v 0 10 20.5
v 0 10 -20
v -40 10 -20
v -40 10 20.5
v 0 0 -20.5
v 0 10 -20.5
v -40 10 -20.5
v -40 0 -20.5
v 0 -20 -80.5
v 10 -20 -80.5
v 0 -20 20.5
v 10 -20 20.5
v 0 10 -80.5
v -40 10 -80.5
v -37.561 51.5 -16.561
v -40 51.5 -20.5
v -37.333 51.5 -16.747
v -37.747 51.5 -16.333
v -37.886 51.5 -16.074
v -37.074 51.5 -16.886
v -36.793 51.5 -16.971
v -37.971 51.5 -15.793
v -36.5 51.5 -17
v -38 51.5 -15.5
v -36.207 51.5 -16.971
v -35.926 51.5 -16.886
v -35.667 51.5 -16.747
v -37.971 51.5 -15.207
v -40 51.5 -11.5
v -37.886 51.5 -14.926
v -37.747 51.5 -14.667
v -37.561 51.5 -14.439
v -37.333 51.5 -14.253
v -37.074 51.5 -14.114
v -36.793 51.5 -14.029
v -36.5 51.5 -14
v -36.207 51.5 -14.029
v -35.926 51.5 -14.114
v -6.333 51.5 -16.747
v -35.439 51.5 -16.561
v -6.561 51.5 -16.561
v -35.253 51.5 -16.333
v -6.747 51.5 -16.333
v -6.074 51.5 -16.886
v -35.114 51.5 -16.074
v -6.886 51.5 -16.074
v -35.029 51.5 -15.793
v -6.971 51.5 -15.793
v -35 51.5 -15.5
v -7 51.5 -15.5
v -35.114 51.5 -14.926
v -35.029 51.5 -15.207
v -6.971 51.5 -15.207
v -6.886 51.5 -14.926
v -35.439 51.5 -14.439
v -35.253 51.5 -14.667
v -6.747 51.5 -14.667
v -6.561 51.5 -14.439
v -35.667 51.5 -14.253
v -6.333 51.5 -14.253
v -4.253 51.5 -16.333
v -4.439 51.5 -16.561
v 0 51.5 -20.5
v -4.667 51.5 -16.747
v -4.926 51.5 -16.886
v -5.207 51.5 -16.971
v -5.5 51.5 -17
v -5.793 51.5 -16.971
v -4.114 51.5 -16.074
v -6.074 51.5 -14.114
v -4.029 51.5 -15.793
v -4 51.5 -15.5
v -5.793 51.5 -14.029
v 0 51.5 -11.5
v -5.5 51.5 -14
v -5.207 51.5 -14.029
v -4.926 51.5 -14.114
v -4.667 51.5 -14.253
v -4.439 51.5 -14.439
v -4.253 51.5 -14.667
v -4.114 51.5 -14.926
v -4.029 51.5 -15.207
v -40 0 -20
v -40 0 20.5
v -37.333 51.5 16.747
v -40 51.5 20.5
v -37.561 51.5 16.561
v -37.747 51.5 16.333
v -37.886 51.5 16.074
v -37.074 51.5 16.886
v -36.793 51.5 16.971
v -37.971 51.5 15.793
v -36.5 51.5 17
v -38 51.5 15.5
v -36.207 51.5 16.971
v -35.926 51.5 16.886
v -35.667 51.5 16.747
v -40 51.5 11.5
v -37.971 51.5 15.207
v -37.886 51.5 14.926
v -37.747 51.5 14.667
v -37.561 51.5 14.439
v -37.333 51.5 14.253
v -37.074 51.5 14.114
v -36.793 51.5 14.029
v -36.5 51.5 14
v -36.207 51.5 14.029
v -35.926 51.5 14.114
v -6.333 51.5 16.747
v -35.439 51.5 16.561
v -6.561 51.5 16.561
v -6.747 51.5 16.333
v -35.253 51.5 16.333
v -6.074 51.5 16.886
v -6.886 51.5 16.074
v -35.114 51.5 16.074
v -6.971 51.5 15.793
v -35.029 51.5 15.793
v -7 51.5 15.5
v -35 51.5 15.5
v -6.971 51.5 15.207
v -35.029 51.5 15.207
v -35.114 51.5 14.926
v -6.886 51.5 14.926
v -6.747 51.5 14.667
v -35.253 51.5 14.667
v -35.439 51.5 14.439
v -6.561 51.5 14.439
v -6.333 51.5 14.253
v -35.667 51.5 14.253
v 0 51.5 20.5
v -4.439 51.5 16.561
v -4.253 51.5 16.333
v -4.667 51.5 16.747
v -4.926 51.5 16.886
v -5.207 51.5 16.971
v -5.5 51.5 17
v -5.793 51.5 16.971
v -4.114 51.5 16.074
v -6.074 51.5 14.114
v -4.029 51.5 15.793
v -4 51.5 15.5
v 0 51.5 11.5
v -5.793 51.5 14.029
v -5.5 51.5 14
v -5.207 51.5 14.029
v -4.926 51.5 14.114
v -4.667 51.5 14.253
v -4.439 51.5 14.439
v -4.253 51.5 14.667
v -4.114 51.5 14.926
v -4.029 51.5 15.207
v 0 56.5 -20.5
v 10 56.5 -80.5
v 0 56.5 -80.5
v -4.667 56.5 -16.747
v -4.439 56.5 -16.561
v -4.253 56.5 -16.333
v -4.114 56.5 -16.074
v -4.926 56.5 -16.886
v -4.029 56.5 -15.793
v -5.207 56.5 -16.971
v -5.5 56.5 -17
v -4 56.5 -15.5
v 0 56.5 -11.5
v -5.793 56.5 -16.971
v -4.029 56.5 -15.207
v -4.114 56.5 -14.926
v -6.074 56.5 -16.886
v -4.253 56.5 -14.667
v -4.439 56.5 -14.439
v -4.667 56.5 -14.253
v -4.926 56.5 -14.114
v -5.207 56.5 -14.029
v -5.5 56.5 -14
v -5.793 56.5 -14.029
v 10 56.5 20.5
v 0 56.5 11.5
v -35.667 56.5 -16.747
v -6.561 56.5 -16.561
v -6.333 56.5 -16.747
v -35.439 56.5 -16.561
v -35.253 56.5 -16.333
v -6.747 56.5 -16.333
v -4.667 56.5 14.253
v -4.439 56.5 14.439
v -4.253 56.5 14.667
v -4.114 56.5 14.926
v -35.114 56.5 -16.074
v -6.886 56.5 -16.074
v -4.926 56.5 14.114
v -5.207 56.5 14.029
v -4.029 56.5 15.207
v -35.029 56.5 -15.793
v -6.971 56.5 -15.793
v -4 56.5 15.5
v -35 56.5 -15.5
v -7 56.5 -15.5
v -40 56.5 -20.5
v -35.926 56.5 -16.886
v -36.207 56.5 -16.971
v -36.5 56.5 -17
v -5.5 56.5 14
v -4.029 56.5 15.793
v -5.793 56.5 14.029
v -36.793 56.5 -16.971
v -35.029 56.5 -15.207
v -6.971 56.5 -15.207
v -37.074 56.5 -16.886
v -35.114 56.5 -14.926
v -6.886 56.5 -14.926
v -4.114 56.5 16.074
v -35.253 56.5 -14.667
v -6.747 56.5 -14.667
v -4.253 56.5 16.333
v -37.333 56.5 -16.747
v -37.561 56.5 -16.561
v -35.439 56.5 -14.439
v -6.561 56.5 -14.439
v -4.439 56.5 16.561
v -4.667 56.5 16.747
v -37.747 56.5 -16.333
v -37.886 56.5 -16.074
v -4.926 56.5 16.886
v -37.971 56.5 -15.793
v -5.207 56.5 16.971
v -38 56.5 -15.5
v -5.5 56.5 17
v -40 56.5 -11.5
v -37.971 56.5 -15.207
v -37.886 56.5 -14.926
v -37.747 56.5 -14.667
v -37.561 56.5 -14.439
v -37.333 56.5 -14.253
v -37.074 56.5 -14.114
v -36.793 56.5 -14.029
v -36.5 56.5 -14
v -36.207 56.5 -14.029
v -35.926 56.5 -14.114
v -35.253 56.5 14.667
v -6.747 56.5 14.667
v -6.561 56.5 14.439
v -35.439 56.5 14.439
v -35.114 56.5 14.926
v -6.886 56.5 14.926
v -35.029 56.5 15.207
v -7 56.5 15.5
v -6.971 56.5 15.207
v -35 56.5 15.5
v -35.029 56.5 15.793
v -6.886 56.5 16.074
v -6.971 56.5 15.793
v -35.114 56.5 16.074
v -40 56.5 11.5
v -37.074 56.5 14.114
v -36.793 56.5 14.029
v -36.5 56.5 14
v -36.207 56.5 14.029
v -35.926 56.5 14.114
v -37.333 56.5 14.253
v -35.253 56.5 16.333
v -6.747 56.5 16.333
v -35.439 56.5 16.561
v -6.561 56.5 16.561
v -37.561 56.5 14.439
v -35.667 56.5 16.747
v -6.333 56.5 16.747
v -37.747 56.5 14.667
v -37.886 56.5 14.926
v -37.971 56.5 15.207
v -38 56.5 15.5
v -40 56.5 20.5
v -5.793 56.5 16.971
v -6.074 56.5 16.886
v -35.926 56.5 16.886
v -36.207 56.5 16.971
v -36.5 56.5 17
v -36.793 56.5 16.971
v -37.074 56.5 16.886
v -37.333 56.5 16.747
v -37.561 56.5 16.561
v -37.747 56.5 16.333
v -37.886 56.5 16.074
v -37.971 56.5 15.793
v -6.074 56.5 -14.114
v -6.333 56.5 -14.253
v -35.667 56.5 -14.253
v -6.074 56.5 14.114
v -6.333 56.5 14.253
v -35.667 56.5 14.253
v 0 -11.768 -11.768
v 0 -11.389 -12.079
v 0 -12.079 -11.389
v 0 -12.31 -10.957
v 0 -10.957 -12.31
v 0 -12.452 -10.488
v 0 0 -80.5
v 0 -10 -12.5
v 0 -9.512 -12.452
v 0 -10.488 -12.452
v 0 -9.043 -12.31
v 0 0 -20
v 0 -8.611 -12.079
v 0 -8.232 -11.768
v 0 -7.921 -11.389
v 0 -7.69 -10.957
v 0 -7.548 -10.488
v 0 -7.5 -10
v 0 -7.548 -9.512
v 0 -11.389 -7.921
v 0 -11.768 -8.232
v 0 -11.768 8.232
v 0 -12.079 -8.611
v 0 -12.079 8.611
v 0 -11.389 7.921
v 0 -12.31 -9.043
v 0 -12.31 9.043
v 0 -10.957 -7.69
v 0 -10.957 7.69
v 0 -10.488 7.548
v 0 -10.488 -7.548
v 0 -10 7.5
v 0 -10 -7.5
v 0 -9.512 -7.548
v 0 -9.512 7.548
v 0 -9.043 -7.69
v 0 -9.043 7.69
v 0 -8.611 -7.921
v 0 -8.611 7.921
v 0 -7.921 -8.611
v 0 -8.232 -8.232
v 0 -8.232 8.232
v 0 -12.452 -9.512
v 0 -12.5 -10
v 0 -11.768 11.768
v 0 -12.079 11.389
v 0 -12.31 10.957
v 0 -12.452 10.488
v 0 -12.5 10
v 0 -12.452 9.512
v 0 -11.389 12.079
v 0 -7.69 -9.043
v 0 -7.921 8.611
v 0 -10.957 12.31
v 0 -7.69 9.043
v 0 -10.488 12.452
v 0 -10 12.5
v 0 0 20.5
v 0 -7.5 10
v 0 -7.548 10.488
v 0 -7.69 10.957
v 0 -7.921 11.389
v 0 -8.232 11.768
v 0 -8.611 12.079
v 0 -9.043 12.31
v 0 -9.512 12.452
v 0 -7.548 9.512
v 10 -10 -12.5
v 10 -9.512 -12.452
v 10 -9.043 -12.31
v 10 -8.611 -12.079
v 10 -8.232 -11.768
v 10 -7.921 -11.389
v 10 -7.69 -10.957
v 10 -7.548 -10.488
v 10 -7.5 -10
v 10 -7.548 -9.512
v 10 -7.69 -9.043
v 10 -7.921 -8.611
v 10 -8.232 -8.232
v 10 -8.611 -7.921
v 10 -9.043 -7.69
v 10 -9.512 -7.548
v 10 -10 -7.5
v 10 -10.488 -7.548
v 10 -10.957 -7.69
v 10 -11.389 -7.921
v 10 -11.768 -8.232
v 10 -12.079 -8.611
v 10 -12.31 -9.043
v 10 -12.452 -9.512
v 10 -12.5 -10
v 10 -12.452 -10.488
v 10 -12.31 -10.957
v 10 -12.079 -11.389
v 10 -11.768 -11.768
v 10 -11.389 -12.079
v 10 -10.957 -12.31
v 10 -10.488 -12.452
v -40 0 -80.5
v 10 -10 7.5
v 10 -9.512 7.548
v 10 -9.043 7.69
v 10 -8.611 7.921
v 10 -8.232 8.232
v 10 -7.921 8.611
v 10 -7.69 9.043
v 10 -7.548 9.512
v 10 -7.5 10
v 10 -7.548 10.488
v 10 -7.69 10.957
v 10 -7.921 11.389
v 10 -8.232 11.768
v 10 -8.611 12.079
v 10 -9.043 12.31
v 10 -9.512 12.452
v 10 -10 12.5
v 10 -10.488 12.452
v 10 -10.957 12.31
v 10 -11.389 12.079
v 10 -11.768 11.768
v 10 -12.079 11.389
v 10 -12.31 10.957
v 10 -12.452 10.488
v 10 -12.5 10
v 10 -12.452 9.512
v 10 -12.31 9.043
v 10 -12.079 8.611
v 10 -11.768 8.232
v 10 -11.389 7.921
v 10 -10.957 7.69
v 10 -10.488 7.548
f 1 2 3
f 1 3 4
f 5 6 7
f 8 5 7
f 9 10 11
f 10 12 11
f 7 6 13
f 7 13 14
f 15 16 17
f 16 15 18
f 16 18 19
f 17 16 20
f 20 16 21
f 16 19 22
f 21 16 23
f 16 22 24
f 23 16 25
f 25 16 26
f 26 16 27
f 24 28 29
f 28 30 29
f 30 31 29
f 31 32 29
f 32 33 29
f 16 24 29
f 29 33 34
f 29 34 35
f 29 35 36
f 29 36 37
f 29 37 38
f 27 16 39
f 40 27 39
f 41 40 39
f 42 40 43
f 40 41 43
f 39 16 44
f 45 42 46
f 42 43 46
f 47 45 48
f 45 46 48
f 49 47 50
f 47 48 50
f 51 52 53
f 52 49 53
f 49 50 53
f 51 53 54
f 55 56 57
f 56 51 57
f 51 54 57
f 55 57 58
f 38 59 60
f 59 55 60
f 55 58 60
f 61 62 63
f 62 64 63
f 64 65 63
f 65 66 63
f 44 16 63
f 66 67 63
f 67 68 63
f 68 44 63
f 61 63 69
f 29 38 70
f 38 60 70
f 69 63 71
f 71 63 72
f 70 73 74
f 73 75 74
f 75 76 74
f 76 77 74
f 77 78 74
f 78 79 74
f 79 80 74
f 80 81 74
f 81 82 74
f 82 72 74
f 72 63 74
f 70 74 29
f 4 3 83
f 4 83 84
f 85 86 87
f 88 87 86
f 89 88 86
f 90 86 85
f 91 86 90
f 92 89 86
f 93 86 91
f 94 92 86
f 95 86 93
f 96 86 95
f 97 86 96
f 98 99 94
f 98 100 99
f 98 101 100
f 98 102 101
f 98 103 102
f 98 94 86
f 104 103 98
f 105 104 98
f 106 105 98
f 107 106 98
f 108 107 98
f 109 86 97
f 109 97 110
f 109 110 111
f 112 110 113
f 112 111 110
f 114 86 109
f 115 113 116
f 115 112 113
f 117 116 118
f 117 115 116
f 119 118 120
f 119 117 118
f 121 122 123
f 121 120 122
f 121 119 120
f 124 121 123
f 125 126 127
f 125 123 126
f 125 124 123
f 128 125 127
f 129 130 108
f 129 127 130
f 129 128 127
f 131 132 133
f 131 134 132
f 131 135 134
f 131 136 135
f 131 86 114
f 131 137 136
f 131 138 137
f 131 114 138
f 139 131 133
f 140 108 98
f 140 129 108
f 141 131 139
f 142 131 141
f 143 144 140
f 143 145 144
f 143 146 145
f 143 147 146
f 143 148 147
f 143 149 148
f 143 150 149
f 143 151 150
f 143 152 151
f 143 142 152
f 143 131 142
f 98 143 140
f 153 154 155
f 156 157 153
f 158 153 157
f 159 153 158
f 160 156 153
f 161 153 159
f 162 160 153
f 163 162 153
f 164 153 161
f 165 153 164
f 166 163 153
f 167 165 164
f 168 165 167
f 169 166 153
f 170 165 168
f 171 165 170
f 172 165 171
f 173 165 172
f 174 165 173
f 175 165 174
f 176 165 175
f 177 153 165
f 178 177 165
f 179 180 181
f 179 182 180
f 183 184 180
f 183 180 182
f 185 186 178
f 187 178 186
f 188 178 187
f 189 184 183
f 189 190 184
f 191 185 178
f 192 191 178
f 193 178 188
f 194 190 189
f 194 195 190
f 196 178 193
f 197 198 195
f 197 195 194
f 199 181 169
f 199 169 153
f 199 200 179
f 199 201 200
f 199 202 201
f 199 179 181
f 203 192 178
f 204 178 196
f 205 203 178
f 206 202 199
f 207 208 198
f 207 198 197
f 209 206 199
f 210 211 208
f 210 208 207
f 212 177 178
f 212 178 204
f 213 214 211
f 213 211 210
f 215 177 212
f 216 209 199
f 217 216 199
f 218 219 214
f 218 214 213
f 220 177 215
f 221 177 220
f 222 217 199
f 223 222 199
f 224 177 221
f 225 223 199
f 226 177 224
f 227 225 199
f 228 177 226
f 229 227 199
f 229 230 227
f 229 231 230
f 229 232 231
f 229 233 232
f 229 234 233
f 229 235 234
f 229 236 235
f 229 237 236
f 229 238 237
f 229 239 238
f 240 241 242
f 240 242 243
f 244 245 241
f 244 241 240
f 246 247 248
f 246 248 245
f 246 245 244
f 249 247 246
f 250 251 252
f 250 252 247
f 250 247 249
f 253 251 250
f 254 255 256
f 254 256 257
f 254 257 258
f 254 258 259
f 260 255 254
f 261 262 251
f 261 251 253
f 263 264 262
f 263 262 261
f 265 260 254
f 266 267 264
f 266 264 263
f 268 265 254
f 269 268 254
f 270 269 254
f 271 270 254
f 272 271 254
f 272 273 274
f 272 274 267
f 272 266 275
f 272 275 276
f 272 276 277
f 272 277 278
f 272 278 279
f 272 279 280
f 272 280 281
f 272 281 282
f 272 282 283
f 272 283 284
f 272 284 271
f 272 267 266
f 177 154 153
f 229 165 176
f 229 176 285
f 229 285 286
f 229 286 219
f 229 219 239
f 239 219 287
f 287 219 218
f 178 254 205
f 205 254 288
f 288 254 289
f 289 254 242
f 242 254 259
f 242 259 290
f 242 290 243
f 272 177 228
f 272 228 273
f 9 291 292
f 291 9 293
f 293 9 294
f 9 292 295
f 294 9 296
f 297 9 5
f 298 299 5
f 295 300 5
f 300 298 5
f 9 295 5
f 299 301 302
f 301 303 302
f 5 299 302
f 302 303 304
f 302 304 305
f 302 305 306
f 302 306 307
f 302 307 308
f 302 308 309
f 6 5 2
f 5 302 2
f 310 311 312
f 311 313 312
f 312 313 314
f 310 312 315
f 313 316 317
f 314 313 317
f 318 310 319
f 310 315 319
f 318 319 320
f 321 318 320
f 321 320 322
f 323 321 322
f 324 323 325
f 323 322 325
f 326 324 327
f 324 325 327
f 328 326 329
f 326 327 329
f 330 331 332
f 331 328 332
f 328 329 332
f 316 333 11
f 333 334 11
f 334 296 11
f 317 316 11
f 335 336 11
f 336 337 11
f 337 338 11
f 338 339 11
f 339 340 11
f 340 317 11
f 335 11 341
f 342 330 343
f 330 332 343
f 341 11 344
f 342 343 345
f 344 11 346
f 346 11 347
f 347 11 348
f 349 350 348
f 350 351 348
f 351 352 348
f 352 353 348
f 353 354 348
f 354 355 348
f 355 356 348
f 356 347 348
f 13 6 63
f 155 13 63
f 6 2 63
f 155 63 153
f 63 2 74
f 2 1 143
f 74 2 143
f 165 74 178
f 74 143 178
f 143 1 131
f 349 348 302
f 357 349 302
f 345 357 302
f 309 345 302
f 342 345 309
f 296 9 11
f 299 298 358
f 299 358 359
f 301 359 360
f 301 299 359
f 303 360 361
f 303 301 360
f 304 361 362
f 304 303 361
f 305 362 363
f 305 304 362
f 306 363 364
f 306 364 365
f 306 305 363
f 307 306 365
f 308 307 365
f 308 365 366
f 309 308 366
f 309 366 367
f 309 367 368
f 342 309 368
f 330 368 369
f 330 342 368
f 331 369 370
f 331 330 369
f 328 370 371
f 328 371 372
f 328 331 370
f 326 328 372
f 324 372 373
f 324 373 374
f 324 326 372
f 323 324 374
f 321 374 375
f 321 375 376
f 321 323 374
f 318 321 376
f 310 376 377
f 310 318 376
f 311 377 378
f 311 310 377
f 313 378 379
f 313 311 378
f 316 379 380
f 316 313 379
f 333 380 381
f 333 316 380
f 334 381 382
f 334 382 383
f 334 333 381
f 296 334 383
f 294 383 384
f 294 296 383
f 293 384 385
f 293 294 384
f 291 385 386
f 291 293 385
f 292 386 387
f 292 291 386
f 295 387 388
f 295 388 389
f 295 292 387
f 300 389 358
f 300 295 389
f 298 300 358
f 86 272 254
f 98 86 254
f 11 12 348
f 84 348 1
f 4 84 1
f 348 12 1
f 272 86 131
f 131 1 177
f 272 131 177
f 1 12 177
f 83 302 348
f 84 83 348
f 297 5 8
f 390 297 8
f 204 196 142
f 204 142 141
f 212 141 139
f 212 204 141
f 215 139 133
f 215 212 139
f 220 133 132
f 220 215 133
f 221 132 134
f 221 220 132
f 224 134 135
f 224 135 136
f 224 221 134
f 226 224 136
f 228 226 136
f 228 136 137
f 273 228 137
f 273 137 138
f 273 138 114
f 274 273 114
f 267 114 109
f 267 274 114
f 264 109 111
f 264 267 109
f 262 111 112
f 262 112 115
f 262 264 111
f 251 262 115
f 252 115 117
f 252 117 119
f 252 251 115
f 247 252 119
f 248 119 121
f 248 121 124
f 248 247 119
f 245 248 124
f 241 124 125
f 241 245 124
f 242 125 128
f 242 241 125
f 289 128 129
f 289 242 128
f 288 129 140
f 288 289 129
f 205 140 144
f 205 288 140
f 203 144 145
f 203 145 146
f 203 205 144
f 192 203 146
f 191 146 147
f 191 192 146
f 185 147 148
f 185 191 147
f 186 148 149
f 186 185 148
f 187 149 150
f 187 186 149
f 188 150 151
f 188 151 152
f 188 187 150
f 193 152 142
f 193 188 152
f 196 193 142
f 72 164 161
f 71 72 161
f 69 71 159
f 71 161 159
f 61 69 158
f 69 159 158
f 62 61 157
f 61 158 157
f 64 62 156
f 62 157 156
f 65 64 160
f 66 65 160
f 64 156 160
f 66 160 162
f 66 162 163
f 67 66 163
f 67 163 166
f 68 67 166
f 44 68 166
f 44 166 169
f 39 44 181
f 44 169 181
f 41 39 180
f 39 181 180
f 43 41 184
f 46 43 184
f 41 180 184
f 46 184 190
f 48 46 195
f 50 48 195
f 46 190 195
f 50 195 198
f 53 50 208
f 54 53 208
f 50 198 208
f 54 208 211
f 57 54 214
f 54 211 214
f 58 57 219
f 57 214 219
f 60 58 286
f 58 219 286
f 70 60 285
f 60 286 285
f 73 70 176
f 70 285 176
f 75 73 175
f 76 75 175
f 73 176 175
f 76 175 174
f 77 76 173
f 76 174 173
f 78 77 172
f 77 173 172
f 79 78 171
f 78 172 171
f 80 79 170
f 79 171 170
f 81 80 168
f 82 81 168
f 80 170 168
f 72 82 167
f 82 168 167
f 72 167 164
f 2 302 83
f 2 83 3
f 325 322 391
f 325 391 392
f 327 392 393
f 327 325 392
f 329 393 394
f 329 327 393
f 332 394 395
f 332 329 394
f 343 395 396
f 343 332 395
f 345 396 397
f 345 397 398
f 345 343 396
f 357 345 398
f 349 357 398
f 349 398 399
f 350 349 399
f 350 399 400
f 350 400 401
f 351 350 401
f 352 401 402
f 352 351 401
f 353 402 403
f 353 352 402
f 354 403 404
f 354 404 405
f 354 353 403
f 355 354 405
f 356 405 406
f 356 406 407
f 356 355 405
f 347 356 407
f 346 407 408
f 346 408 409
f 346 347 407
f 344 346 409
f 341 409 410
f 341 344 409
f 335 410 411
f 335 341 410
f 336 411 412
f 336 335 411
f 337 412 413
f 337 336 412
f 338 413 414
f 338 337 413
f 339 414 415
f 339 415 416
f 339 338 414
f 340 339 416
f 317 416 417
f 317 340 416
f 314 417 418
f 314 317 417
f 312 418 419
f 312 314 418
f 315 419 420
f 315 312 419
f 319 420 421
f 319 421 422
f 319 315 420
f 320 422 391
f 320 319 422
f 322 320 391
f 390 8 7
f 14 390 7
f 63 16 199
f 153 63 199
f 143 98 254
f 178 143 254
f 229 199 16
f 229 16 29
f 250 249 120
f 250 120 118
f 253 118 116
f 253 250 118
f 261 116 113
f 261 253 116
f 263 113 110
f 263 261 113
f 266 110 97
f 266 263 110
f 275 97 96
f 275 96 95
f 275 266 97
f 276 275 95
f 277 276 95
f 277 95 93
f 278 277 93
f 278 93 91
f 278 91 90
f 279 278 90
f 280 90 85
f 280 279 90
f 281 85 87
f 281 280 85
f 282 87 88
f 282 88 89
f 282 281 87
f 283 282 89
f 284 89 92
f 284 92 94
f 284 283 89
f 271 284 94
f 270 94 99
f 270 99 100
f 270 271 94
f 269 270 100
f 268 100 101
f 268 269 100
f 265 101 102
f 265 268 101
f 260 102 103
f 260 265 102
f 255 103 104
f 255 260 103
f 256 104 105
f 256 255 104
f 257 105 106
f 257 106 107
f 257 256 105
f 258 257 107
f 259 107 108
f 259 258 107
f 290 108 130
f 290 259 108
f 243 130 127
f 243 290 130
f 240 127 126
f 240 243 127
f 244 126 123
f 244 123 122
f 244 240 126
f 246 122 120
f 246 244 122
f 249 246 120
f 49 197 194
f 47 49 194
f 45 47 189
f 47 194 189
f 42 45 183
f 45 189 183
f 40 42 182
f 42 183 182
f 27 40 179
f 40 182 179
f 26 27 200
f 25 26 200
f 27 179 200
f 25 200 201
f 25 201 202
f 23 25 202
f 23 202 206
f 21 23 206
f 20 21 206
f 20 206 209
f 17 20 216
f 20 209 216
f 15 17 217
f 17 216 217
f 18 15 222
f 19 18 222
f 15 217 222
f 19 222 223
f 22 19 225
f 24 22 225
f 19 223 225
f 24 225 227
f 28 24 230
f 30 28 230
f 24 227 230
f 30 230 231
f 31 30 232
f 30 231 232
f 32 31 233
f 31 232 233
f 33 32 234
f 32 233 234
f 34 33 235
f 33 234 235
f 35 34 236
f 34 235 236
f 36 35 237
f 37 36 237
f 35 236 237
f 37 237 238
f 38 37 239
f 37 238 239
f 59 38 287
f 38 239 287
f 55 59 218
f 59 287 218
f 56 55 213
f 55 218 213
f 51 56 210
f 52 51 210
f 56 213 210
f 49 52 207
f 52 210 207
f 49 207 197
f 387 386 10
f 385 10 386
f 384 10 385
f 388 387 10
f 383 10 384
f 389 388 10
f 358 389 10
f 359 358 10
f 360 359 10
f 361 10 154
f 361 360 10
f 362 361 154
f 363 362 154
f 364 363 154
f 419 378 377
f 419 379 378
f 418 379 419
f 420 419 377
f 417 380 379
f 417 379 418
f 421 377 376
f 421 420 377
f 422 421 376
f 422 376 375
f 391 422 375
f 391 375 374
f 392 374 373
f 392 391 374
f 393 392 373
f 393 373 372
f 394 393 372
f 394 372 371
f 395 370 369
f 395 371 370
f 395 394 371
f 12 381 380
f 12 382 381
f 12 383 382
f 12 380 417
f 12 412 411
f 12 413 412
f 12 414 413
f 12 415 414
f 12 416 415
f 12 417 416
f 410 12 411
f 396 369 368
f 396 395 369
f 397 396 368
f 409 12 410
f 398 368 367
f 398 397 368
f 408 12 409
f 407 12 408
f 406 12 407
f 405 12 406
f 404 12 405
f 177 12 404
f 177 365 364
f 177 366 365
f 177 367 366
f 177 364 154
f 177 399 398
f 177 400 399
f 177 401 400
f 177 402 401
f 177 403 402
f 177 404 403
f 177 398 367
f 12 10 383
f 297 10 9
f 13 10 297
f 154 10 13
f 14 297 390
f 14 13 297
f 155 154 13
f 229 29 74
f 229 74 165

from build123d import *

# Parameters (mm, degrees)
SKETCH1_W           = 41
SKETCH1_H           = 56.5
SKETCH1_H_2         = 20
SKETCH1_R           = 2.5
BOSS_EXTRUDE1_DEPTH = 10
SKETCH3_W           = 40.5
SKETCH3_H           = 10
BOSS_EXTRUDE2_DEPTH = 40
SKETCH4_W           = 9
SKETCH4_H           = 5
BOSS_EXTRUDE3_DEPTH = 40
SKETCH5_R           = 1.5
CUT_EXTRUDE1_DEPTH  = 5
SKETCH6_W           = 10
SKETCH6_H           = 76.5
SKETCH6_W_2         = 40
SKETCH6_H_2         = 10
BOSS_EXTRUDE4_DEPTH = 60


with BuildPart() as part:
    # Sketch1 → Boss-Extrude1 (new body)
    with BuildSketch(Plane(origin=(0, 0, 0), x_dir=(0, 0, -1), z_dir=(1, 0, 0))):
        with Locations((0, 28.25)):
            Rectangle(SKETCH1_W, SKETCH1_H)
        with Locations((0, -10)):
            Rectangle(SKETCH1_W, SKETCH1_H_2)
        with Locations((10, -10)):
            Circle(SKETCH1_R, mode=Mode.SUBTRACT)
        with Locations((-10, -10)):
            Circle(SKETCH1_R, mode=Mode.SUBTRACT)
    extrude(amount=BOSS_EXTRUDE1_DEPTH)

    # Sketch3 → Boss-Extrude2 (add)
    with BuildSketch(Plane.ZY):
        with Locations((0.25, 5)):
            Rectangle(SKETCH3_W, SKETCH3_H)
    extrude(amount=BOSS_EXTRUDE2_DEPTH)

    # Sketch4 → Boss-Extrude3 (add)
    with BuildSketch(Plane.ZY):
        with Locations((-16, 54)):
            Rectangle(SKETCH4_W, SKETCH4_H)
    boss_extrude3 = extrude(amount=BOSS_EXTRUDE3_DEPTH)

    # Sketch5 → Cut-Extrude1 (cut)
    with BuildSketch(Plane(origin=(0, 56.5, 0), x_dir=(1, 0, 0), z_dir=(0, 1, 0))):
        with Locations((-36.5, 15.5)):
            Circle(SKETCH5_R)
        with Locations((-5.5, 15.5)):
            Circle(SKETCH5_R)
    cut_extrude1 = extrude(amount=-CUT_EXTRUDE1_DEPTH, mode=Mode.SUBTRACT)

    # Mirror2: Boss-Extrude3, Cut-Extrude1 across plane
    add(boss_extrude3.mirror(Plane.XY))
    add(cut_extrude1.mirror(Plane.XY), mode=Mode.SUBTRACT)

    # Sketch6 → Boss-Extrude4 (add)
    with BuildSketch(Plane(origin=(0, 0, -20.5), x_dir=(-1, 0, 0), z_dir=(0, 0, -1))):
        with Locations((-5, 18.25)):
            Rectangle(SKETCH6_W, SKETCH6_H)
        with Locations((20, 5)):
            Rectangle(SKETCH6_W_2, SKETCH6_H_2)
    extrude(amount=BOSS_EXTRUDE4_DEPTH)


solid = part.part
